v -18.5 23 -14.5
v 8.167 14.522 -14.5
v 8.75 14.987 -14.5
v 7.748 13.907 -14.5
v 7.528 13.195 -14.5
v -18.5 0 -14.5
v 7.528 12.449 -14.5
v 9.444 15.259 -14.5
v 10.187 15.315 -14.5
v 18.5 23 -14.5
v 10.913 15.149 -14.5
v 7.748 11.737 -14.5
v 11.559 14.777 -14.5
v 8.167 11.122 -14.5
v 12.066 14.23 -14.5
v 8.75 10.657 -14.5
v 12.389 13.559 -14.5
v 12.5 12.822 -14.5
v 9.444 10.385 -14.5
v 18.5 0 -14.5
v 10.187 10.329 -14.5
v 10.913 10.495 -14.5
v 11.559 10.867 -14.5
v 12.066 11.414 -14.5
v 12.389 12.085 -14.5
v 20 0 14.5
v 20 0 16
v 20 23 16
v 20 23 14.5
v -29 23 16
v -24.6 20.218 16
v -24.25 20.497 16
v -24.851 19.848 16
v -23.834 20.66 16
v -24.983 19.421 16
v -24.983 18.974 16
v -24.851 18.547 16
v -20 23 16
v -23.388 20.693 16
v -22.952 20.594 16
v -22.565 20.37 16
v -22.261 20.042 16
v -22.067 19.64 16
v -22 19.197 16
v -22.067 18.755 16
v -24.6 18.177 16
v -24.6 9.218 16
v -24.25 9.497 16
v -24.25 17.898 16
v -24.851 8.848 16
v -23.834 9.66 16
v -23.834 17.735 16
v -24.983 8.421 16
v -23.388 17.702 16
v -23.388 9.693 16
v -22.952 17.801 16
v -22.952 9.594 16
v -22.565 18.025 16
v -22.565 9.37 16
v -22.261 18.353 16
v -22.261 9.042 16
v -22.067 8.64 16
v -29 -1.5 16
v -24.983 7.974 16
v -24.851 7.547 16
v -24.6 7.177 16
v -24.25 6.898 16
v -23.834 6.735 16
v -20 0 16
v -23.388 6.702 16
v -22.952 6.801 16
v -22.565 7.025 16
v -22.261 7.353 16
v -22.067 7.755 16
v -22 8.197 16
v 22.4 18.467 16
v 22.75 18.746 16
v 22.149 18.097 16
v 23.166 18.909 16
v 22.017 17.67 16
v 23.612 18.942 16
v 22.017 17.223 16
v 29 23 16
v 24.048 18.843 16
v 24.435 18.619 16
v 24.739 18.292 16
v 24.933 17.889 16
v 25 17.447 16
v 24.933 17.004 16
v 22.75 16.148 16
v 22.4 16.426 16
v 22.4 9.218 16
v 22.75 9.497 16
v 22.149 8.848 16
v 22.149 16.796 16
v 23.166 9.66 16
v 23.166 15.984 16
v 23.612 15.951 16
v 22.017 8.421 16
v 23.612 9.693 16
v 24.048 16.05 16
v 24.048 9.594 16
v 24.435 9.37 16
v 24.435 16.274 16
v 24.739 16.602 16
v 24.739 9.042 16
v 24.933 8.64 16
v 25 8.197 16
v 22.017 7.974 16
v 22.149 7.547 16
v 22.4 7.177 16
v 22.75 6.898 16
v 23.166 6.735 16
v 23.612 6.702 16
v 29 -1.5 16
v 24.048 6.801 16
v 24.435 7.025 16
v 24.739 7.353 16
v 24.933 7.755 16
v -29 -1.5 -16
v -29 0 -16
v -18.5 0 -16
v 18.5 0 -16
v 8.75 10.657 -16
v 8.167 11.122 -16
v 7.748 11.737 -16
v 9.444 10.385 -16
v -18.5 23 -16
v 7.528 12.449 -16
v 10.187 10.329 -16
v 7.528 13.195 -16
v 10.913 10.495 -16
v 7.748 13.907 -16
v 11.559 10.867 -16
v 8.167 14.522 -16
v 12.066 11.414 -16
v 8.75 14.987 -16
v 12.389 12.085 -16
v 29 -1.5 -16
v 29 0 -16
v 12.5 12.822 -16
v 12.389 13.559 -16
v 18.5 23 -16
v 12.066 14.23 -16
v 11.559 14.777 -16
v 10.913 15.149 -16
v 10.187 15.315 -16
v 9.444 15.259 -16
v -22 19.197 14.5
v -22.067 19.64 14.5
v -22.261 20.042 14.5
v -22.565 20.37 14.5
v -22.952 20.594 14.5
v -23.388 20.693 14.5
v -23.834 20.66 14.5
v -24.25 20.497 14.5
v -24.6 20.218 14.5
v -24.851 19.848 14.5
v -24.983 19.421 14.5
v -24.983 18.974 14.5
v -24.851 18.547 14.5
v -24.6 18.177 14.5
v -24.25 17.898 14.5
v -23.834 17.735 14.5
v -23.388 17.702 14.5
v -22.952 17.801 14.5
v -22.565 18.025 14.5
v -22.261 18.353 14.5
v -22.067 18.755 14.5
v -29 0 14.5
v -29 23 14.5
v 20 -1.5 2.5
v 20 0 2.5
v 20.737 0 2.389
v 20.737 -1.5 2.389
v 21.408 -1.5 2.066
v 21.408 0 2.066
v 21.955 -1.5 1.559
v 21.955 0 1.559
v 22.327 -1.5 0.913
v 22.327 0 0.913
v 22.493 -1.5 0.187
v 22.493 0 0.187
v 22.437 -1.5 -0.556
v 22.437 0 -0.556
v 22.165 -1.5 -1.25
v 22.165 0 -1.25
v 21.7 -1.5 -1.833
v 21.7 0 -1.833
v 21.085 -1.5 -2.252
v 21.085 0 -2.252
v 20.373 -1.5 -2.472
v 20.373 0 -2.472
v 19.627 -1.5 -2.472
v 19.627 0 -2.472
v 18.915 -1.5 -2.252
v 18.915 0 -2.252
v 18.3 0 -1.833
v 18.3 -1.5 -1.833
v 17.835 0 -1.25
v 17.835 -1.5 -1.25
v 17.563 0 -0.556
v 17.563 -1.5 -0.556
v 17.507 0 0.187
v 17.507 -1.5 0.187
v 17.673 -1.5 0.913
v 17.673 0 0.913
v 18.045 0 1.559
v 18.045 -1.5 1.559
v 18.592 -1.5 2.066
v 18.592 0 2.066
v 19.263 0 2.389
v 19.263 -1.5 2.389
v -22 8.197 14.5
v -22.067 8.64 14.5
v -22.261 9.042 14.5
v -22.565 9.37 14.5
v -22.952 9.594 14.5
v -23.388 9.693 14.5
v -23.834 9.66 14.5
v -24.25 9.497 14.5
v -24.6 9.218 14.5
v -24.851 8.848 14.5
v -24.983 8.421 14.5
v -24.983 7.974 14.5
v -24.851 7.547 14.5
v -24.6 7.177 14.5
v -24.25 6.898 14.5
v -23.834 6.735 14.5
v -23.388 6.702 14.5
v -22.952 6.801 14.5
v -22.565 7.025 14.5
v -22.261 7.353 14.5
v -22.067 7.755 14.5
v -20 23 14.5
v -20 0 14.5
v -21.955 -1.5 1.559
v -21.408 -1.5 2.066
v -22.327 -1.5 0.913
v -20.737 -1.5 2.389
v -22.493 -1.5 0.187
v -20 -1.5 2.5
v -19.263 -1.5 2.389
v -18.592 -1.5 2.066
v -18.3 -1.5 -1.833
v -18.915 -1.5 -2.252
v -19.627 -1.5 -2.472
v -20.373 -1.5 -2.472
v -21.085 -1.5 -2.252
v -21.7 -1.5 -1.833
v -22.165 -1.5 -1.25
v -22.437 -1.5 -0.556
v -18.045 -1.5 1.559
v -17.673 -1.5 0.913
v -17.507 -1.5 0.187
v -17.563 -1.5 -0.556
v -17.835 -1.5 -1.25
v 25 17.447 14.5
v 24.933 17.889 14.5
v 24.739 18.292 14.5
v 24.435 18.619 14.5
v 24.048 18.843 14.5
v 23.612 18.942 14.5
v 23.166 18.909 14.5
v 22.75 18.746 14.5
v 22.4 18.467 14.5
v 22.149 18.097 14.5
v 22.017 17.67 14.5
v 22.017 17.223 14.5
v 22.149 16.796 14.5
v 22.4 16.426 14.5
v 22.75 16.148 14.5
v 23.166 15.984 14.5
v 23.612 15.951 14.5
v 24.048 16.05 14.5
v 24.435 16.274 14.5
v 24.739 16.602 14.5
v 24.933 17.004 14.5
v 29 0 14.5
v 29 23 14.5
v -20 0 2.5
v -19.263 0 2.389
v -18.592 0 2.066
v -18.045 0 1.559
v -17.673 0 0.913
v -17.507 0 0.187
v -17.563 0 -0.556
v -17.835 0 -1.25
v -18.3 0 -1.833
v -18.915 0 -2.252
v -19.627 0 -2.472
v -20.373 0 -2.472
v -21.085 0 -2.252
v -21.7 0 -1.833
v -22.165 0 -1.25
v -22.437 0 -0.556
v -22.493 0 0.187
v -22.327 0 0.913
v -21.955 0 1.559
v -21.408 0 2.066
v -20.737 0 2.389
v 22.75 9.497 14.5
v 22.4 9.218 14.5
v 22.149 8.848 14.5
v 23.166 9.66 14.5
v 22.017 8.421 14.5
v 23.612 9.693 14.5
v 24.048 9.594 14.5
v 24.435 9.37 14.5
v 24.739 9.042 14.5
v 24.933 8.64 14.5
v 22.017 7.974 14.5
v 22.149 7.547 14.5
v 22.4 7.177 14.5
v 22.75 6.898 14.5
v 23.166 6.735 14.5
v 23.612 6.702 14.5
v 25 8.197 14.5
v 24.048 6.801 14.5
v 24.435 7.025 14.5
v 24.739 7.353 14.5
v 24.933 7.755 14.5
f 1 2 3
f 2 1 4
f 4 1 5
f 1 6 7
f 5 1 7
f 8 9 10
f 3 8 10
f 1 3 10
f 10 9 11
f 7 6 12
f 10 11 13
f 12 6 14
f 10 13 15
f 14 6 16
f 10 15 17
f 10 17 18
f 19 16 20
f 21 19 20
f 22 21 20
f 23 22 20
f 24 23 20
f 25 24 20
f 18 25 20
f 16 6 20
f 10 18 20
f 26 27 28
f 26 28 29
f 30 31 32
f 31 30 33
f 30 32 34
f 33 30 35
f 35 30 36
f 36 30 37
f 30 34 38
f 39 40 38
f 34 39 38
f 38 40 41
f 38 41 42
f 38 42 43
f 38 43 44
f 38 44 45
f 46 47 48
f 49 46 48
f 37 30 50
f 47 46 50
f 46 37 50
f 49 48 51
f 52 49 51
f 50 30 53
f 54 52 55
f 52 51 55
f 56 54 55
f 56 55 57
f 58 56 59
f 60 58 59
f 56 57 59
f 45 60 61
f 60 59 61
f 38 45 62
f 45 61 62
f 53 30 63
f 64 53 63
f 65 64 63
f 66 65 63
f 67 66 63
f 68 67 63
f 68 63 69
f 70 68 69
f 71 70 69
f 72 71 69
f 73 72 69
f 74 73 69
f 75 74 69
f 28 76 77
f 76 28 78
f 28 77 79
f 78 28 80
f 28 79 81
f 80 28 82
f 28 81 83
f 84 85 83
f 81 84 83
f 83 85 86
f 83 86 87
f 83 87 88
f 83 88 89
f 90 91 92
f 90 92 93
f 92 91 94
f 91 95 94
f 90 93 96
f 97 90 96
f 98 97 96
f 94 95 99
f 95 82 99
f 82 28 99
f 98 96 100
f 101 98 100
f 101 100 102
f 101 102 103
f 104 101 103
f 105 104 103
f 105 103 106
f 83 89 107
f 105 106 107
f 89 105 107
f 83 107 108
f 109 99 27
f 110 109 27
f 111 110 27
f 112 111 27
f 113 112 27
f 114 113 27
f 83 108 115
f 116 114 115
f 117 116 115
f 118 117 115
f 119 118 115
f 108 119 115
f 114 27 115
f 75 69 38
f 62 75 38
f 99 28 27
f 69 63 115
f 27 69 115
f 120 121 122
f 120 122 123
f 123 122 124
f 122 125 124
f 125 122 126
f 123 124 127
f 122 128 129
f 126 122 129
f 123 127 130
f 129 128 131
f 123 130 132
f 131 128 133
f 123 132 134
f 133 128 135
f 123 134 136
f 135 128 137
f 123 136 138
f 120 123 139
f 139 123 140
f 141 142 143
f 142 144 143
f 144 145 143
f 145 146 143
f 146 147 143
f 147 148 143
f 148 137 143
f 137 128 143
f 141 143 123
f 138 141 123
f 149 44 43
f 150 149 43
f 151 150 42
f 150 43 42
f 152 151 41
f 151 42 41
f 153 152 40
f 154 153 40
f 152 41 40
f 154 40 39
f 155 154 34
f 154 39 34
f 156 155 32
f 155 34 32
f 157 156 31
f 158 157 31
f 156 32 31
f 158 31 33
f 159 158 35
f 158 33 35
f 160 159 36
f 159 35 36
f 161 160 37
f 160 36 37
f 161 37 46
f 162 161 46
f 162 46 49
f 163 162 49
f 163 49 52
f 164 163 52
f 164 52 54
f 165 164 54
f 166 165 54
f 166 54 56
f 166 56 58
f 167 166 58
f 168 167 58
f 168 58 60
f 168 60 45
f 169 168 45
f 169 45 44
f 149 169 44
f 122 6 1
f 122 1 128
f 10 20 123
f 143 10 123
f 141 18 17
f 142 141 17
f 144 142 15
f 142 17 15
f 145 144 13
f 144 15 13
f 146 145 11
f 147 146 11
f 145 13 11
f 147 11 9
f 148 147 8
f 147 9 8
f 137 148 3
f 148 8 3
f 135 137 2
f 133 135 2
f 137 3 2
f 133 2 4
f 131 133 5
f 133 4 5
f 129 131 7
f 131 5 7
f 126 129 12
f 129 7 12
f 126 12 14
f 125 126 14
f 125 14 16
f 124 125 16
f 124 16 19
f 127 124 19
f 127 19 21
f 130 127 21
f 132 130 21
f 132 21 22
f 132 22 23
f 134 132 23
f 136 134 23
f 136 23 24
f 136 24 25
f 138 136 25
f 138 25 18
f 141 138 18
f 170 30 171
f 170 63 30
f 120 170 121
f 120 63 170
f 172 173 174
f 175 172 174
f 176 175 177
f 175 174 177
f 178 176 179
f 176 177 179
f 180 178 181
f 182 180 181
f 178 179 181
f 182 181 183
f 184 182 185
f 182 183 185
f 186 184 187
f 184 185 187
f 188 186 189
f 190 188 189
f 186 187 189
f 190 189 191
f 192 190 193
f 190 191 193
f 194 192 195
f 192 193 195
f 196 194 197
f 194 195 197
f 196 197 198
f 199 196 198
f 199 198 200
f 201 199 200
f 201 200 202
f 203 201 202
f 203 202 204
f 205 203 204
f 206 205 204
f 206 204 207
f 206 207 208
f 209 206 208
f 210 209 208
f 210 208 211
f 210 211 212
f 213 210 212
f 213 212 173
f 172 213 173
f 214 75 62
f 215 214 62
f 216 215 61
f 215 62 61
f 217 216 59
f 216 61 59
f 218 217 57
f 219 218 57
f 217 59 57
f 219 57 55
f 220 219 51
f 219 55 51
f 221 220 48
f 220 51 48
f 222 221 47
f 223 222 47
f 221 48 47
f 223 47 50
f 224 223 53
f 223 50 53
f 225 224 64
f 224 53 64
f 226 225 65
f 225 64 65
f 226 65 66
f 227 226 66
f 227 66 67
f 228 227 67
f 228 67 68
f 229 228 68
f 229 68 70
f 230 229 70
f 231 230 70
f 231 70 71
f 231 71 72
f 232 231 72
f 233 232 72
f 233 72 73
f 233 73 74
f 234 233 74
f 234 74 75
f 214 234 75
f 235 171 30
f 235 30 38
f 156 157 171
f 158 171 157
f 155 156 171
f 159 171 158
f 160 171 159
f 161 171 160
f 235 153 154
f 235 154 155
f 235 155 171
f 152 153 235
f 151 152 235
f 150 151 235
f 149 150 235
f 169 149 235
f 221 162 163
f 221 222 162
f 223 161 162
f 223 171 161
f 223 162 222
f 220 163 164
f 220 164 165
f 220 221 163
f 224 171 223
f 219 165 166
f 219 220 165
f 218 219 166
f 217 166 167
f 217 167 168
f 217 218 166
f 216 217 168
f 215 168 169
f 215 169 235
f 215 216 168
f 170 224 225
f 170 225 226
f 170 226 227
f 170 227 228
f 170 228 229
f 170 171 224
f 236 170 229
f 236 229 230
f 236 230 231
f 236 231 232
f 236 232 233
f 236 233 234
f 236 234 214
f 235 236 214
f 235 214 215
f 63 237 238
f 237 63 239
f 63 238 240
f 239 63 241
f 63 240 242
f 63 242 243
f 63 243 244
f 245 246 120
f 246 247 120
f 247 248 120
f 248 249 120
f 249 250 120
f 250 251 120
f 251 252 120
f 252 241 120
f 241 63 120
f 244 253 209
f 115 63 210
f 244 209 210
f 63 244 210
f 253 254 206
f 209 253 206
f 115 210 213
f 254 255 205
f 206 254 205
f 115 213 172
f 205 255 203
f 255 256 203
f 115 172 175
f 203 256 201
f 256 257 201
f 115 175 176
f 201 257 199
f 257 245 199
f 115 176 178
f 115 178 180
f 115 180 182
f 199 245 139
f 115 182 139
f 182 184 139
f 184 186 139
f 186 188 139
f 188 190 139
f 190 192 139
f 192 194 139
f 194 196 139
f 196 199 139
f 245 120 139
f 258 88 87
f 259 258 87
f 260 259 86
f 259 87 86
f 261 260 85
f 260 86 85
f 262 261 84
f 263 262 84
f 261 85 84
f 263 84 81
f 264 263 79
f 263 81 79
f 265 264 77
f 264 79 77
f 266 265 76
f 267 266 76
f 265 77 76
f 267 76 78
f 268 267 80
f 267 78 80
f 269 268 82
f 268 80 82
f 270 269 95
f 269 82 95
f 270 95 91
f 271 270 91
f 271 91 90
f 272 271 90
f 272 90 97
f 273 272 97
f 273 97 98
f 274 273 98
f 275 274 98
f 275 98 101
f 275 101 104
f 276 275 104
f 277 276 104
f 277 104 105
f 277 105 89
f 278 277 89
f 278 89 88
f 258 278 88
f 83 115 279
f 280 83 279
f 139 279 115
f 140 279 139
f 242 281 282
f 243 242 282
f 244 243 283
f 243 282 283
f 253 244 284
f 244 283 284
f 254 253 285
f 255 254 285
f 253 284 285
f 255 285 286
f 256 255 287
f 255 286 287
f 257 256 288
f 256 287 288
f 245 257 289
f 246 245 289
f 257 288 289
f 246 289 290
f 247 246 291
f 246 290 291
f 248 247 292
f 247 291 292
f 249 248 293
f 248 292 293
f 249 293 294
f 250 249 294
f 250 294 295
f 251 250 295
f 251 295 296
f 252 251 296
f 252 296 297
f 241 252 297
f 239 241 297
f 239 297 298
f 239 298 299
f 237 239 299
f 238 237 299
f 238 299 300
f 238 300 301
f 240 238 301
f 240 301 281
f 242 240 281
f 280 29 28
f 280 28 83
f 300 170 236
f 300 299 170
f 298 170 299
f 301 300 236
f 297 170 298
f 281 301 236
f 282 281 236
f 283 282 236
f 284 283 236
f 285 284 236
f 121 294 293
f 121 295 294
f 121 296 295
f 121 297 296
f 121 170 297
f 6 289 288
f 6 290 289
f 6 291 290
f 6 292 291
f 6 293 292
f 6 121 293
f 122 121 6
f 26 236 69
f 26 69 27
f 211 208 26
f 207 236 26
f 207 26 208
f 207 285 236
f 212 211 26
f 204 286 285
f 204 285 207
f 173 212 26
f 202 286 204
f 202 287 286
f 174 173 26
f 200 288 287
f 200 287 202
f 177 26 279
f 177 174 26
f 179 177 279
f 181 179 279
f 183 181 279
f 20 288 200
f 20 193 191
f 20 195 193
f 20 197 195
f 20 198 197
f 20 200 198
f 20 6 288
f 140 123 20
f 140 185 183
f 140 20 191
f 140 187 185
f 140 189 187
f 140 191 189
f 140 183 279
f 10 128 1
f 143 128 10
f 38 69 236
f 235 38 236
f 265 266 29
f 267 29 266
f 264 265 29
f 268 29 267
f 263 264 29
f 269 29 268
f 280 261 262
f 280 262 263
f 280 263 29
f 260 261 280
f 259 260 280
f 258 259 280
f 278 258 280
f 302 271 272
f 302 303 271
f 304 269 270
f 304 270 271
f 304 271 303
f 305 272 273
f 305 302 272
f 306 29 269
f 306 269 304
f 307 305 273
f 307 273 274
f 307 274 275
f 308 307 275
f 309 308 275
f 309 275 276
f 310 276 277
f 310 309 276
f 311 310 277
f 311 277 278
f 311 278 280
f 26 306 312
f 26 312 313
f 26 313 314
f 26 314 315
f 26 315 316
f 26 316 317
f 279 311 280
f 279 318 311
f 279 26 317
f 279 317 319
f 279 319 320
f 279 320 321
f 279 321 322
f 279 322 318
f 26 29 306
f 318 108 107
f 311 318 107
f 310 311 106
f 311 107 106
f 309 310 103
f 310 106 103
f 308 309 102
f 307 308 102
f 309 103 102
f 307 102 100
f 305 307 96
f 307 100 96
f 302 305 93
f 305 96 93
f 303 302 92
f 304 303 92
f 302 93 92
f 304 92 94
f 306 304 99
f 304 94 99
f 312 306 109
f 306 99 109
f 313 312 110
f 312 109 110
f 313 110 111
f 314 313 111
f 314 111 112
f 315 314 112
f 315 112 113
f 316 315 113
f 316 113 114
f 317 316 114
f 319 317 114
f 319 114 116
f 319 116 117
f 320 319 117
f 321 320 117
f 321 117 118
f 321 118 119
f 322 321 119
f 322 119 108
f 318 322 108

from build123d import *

# Parameters (mm, degrees)
SKETCH1_W           = 58
SKETCH1_H           = 32
BOSS_EXTRUDE1_DEPTH = 1.5
SKETCH1_3_W         = 9
SKETCH1_3_H         = 1.5
BOSS_EXTRUDE2_DEPTH = 23
SKETCH2_R           = 1.5
CUT_EXTRUDE1_DEPTH  = 49.928519291
SKETCH1_4_W         = 37
SKETCH1_4_H         = 1.5
BOSS_EXTRUDE3_DEPTH = 23
SKETCH3_R           = 2.5
CUT_EXTRUDE2_DEPTH  = 48.960921592
SKETCH1_5_R         = 2.5
CUT_EXTRUDE3_DEPTH  = 25


with BuildPart() as part:
    # Sketch1 → Boss-Extrude1 (new body)
    with BuildSketch(Plane(origin=(0, 0, 0), x_dir=(1, 0, 0), z_dir=(0, 1, 0))):
        Rectangle(SKETCH1_W, SKETCH1_H)
    extrude(amount=-BOSS_EXTRUDE1_DEPTH)

    # Sketch1<3> → Boss-Extrude2 (add)
    with BuildSketch(Plane(origin=(0, 0, 0), x_dir=(1, 0, 0), z_dir=(0, 1, 0))):
        with Locations((-24.5, -15.25)):
            Rectangle(SKETCH1_3_W, SKETCH1_3_H)
        with Locations((24.5, -15.25)):
            Rectangle(SKETCH1_3_W, SKETCH1_3_H)
    extrude(amount=BOSS_EXTRUDE2_DEPTH)

    # Sketch2 → Cut-Extrude1 (cut, through all)
    with BuildSketch(Plane.XY.offset(16)):
        with Locations((-23.5, 19.197487824)):
            Circle(SKETCH2_R)
        with Locations((-23.5, 8.197487824)):
            Circle(SKETCH2_R)
        with Locations((23.5, 17.446590768)):
            Circle(SKETCH2_R)
        with Locations((23.5, 8.197487824)):
            Circle(SKETCH2_R)
    extrude(amount=-CUT_EXTRUDE1_DEPTH, mode=Mode.SUBTRACT)

    # Sketch1<4> → Boss-Extrude3 (add)
    with BuildSketch(Plane(origin=(0, 0, 0), x_dir=(1, 0, 0), z_dir=(0, 1, 0))):
        with Locations((0, 15.25)):
            Rectangle(SKETCH1_4_W, SKETCH1_4_H)
    extrude(amount=BOSS_EXTRUDE3_DEPTH)

    # Sketch3 → Cut-Extrude2 (cut, through all)
    with BuildSketch(Plane.XY.offset(-14.5)):
        with Locations((10, 12.822039296)):
            Circle(SKETCH3_R)
    extrude(amount=-CUT_EXTRUDE2_DEPTH, mode=Mode.SUBTRACT)

    # Sketch1<5> → Cut-Extrude3 (cut)
    with BuildSketch(Plane(origin=(0, 0, 0), x_dir=(1, 0, 0), z_dir=(0, 1, 0))):
        with Locations((-20, 0)):
            Circle(SKETCH1_5_R)
        with Locations((20, 0)):
            Circle(SKETCH1_5_R)
    extrude(amount=-CUT_EXTRUDE3_DEPTH, mode=Mode.SUBTRACT)


solid = part.part
